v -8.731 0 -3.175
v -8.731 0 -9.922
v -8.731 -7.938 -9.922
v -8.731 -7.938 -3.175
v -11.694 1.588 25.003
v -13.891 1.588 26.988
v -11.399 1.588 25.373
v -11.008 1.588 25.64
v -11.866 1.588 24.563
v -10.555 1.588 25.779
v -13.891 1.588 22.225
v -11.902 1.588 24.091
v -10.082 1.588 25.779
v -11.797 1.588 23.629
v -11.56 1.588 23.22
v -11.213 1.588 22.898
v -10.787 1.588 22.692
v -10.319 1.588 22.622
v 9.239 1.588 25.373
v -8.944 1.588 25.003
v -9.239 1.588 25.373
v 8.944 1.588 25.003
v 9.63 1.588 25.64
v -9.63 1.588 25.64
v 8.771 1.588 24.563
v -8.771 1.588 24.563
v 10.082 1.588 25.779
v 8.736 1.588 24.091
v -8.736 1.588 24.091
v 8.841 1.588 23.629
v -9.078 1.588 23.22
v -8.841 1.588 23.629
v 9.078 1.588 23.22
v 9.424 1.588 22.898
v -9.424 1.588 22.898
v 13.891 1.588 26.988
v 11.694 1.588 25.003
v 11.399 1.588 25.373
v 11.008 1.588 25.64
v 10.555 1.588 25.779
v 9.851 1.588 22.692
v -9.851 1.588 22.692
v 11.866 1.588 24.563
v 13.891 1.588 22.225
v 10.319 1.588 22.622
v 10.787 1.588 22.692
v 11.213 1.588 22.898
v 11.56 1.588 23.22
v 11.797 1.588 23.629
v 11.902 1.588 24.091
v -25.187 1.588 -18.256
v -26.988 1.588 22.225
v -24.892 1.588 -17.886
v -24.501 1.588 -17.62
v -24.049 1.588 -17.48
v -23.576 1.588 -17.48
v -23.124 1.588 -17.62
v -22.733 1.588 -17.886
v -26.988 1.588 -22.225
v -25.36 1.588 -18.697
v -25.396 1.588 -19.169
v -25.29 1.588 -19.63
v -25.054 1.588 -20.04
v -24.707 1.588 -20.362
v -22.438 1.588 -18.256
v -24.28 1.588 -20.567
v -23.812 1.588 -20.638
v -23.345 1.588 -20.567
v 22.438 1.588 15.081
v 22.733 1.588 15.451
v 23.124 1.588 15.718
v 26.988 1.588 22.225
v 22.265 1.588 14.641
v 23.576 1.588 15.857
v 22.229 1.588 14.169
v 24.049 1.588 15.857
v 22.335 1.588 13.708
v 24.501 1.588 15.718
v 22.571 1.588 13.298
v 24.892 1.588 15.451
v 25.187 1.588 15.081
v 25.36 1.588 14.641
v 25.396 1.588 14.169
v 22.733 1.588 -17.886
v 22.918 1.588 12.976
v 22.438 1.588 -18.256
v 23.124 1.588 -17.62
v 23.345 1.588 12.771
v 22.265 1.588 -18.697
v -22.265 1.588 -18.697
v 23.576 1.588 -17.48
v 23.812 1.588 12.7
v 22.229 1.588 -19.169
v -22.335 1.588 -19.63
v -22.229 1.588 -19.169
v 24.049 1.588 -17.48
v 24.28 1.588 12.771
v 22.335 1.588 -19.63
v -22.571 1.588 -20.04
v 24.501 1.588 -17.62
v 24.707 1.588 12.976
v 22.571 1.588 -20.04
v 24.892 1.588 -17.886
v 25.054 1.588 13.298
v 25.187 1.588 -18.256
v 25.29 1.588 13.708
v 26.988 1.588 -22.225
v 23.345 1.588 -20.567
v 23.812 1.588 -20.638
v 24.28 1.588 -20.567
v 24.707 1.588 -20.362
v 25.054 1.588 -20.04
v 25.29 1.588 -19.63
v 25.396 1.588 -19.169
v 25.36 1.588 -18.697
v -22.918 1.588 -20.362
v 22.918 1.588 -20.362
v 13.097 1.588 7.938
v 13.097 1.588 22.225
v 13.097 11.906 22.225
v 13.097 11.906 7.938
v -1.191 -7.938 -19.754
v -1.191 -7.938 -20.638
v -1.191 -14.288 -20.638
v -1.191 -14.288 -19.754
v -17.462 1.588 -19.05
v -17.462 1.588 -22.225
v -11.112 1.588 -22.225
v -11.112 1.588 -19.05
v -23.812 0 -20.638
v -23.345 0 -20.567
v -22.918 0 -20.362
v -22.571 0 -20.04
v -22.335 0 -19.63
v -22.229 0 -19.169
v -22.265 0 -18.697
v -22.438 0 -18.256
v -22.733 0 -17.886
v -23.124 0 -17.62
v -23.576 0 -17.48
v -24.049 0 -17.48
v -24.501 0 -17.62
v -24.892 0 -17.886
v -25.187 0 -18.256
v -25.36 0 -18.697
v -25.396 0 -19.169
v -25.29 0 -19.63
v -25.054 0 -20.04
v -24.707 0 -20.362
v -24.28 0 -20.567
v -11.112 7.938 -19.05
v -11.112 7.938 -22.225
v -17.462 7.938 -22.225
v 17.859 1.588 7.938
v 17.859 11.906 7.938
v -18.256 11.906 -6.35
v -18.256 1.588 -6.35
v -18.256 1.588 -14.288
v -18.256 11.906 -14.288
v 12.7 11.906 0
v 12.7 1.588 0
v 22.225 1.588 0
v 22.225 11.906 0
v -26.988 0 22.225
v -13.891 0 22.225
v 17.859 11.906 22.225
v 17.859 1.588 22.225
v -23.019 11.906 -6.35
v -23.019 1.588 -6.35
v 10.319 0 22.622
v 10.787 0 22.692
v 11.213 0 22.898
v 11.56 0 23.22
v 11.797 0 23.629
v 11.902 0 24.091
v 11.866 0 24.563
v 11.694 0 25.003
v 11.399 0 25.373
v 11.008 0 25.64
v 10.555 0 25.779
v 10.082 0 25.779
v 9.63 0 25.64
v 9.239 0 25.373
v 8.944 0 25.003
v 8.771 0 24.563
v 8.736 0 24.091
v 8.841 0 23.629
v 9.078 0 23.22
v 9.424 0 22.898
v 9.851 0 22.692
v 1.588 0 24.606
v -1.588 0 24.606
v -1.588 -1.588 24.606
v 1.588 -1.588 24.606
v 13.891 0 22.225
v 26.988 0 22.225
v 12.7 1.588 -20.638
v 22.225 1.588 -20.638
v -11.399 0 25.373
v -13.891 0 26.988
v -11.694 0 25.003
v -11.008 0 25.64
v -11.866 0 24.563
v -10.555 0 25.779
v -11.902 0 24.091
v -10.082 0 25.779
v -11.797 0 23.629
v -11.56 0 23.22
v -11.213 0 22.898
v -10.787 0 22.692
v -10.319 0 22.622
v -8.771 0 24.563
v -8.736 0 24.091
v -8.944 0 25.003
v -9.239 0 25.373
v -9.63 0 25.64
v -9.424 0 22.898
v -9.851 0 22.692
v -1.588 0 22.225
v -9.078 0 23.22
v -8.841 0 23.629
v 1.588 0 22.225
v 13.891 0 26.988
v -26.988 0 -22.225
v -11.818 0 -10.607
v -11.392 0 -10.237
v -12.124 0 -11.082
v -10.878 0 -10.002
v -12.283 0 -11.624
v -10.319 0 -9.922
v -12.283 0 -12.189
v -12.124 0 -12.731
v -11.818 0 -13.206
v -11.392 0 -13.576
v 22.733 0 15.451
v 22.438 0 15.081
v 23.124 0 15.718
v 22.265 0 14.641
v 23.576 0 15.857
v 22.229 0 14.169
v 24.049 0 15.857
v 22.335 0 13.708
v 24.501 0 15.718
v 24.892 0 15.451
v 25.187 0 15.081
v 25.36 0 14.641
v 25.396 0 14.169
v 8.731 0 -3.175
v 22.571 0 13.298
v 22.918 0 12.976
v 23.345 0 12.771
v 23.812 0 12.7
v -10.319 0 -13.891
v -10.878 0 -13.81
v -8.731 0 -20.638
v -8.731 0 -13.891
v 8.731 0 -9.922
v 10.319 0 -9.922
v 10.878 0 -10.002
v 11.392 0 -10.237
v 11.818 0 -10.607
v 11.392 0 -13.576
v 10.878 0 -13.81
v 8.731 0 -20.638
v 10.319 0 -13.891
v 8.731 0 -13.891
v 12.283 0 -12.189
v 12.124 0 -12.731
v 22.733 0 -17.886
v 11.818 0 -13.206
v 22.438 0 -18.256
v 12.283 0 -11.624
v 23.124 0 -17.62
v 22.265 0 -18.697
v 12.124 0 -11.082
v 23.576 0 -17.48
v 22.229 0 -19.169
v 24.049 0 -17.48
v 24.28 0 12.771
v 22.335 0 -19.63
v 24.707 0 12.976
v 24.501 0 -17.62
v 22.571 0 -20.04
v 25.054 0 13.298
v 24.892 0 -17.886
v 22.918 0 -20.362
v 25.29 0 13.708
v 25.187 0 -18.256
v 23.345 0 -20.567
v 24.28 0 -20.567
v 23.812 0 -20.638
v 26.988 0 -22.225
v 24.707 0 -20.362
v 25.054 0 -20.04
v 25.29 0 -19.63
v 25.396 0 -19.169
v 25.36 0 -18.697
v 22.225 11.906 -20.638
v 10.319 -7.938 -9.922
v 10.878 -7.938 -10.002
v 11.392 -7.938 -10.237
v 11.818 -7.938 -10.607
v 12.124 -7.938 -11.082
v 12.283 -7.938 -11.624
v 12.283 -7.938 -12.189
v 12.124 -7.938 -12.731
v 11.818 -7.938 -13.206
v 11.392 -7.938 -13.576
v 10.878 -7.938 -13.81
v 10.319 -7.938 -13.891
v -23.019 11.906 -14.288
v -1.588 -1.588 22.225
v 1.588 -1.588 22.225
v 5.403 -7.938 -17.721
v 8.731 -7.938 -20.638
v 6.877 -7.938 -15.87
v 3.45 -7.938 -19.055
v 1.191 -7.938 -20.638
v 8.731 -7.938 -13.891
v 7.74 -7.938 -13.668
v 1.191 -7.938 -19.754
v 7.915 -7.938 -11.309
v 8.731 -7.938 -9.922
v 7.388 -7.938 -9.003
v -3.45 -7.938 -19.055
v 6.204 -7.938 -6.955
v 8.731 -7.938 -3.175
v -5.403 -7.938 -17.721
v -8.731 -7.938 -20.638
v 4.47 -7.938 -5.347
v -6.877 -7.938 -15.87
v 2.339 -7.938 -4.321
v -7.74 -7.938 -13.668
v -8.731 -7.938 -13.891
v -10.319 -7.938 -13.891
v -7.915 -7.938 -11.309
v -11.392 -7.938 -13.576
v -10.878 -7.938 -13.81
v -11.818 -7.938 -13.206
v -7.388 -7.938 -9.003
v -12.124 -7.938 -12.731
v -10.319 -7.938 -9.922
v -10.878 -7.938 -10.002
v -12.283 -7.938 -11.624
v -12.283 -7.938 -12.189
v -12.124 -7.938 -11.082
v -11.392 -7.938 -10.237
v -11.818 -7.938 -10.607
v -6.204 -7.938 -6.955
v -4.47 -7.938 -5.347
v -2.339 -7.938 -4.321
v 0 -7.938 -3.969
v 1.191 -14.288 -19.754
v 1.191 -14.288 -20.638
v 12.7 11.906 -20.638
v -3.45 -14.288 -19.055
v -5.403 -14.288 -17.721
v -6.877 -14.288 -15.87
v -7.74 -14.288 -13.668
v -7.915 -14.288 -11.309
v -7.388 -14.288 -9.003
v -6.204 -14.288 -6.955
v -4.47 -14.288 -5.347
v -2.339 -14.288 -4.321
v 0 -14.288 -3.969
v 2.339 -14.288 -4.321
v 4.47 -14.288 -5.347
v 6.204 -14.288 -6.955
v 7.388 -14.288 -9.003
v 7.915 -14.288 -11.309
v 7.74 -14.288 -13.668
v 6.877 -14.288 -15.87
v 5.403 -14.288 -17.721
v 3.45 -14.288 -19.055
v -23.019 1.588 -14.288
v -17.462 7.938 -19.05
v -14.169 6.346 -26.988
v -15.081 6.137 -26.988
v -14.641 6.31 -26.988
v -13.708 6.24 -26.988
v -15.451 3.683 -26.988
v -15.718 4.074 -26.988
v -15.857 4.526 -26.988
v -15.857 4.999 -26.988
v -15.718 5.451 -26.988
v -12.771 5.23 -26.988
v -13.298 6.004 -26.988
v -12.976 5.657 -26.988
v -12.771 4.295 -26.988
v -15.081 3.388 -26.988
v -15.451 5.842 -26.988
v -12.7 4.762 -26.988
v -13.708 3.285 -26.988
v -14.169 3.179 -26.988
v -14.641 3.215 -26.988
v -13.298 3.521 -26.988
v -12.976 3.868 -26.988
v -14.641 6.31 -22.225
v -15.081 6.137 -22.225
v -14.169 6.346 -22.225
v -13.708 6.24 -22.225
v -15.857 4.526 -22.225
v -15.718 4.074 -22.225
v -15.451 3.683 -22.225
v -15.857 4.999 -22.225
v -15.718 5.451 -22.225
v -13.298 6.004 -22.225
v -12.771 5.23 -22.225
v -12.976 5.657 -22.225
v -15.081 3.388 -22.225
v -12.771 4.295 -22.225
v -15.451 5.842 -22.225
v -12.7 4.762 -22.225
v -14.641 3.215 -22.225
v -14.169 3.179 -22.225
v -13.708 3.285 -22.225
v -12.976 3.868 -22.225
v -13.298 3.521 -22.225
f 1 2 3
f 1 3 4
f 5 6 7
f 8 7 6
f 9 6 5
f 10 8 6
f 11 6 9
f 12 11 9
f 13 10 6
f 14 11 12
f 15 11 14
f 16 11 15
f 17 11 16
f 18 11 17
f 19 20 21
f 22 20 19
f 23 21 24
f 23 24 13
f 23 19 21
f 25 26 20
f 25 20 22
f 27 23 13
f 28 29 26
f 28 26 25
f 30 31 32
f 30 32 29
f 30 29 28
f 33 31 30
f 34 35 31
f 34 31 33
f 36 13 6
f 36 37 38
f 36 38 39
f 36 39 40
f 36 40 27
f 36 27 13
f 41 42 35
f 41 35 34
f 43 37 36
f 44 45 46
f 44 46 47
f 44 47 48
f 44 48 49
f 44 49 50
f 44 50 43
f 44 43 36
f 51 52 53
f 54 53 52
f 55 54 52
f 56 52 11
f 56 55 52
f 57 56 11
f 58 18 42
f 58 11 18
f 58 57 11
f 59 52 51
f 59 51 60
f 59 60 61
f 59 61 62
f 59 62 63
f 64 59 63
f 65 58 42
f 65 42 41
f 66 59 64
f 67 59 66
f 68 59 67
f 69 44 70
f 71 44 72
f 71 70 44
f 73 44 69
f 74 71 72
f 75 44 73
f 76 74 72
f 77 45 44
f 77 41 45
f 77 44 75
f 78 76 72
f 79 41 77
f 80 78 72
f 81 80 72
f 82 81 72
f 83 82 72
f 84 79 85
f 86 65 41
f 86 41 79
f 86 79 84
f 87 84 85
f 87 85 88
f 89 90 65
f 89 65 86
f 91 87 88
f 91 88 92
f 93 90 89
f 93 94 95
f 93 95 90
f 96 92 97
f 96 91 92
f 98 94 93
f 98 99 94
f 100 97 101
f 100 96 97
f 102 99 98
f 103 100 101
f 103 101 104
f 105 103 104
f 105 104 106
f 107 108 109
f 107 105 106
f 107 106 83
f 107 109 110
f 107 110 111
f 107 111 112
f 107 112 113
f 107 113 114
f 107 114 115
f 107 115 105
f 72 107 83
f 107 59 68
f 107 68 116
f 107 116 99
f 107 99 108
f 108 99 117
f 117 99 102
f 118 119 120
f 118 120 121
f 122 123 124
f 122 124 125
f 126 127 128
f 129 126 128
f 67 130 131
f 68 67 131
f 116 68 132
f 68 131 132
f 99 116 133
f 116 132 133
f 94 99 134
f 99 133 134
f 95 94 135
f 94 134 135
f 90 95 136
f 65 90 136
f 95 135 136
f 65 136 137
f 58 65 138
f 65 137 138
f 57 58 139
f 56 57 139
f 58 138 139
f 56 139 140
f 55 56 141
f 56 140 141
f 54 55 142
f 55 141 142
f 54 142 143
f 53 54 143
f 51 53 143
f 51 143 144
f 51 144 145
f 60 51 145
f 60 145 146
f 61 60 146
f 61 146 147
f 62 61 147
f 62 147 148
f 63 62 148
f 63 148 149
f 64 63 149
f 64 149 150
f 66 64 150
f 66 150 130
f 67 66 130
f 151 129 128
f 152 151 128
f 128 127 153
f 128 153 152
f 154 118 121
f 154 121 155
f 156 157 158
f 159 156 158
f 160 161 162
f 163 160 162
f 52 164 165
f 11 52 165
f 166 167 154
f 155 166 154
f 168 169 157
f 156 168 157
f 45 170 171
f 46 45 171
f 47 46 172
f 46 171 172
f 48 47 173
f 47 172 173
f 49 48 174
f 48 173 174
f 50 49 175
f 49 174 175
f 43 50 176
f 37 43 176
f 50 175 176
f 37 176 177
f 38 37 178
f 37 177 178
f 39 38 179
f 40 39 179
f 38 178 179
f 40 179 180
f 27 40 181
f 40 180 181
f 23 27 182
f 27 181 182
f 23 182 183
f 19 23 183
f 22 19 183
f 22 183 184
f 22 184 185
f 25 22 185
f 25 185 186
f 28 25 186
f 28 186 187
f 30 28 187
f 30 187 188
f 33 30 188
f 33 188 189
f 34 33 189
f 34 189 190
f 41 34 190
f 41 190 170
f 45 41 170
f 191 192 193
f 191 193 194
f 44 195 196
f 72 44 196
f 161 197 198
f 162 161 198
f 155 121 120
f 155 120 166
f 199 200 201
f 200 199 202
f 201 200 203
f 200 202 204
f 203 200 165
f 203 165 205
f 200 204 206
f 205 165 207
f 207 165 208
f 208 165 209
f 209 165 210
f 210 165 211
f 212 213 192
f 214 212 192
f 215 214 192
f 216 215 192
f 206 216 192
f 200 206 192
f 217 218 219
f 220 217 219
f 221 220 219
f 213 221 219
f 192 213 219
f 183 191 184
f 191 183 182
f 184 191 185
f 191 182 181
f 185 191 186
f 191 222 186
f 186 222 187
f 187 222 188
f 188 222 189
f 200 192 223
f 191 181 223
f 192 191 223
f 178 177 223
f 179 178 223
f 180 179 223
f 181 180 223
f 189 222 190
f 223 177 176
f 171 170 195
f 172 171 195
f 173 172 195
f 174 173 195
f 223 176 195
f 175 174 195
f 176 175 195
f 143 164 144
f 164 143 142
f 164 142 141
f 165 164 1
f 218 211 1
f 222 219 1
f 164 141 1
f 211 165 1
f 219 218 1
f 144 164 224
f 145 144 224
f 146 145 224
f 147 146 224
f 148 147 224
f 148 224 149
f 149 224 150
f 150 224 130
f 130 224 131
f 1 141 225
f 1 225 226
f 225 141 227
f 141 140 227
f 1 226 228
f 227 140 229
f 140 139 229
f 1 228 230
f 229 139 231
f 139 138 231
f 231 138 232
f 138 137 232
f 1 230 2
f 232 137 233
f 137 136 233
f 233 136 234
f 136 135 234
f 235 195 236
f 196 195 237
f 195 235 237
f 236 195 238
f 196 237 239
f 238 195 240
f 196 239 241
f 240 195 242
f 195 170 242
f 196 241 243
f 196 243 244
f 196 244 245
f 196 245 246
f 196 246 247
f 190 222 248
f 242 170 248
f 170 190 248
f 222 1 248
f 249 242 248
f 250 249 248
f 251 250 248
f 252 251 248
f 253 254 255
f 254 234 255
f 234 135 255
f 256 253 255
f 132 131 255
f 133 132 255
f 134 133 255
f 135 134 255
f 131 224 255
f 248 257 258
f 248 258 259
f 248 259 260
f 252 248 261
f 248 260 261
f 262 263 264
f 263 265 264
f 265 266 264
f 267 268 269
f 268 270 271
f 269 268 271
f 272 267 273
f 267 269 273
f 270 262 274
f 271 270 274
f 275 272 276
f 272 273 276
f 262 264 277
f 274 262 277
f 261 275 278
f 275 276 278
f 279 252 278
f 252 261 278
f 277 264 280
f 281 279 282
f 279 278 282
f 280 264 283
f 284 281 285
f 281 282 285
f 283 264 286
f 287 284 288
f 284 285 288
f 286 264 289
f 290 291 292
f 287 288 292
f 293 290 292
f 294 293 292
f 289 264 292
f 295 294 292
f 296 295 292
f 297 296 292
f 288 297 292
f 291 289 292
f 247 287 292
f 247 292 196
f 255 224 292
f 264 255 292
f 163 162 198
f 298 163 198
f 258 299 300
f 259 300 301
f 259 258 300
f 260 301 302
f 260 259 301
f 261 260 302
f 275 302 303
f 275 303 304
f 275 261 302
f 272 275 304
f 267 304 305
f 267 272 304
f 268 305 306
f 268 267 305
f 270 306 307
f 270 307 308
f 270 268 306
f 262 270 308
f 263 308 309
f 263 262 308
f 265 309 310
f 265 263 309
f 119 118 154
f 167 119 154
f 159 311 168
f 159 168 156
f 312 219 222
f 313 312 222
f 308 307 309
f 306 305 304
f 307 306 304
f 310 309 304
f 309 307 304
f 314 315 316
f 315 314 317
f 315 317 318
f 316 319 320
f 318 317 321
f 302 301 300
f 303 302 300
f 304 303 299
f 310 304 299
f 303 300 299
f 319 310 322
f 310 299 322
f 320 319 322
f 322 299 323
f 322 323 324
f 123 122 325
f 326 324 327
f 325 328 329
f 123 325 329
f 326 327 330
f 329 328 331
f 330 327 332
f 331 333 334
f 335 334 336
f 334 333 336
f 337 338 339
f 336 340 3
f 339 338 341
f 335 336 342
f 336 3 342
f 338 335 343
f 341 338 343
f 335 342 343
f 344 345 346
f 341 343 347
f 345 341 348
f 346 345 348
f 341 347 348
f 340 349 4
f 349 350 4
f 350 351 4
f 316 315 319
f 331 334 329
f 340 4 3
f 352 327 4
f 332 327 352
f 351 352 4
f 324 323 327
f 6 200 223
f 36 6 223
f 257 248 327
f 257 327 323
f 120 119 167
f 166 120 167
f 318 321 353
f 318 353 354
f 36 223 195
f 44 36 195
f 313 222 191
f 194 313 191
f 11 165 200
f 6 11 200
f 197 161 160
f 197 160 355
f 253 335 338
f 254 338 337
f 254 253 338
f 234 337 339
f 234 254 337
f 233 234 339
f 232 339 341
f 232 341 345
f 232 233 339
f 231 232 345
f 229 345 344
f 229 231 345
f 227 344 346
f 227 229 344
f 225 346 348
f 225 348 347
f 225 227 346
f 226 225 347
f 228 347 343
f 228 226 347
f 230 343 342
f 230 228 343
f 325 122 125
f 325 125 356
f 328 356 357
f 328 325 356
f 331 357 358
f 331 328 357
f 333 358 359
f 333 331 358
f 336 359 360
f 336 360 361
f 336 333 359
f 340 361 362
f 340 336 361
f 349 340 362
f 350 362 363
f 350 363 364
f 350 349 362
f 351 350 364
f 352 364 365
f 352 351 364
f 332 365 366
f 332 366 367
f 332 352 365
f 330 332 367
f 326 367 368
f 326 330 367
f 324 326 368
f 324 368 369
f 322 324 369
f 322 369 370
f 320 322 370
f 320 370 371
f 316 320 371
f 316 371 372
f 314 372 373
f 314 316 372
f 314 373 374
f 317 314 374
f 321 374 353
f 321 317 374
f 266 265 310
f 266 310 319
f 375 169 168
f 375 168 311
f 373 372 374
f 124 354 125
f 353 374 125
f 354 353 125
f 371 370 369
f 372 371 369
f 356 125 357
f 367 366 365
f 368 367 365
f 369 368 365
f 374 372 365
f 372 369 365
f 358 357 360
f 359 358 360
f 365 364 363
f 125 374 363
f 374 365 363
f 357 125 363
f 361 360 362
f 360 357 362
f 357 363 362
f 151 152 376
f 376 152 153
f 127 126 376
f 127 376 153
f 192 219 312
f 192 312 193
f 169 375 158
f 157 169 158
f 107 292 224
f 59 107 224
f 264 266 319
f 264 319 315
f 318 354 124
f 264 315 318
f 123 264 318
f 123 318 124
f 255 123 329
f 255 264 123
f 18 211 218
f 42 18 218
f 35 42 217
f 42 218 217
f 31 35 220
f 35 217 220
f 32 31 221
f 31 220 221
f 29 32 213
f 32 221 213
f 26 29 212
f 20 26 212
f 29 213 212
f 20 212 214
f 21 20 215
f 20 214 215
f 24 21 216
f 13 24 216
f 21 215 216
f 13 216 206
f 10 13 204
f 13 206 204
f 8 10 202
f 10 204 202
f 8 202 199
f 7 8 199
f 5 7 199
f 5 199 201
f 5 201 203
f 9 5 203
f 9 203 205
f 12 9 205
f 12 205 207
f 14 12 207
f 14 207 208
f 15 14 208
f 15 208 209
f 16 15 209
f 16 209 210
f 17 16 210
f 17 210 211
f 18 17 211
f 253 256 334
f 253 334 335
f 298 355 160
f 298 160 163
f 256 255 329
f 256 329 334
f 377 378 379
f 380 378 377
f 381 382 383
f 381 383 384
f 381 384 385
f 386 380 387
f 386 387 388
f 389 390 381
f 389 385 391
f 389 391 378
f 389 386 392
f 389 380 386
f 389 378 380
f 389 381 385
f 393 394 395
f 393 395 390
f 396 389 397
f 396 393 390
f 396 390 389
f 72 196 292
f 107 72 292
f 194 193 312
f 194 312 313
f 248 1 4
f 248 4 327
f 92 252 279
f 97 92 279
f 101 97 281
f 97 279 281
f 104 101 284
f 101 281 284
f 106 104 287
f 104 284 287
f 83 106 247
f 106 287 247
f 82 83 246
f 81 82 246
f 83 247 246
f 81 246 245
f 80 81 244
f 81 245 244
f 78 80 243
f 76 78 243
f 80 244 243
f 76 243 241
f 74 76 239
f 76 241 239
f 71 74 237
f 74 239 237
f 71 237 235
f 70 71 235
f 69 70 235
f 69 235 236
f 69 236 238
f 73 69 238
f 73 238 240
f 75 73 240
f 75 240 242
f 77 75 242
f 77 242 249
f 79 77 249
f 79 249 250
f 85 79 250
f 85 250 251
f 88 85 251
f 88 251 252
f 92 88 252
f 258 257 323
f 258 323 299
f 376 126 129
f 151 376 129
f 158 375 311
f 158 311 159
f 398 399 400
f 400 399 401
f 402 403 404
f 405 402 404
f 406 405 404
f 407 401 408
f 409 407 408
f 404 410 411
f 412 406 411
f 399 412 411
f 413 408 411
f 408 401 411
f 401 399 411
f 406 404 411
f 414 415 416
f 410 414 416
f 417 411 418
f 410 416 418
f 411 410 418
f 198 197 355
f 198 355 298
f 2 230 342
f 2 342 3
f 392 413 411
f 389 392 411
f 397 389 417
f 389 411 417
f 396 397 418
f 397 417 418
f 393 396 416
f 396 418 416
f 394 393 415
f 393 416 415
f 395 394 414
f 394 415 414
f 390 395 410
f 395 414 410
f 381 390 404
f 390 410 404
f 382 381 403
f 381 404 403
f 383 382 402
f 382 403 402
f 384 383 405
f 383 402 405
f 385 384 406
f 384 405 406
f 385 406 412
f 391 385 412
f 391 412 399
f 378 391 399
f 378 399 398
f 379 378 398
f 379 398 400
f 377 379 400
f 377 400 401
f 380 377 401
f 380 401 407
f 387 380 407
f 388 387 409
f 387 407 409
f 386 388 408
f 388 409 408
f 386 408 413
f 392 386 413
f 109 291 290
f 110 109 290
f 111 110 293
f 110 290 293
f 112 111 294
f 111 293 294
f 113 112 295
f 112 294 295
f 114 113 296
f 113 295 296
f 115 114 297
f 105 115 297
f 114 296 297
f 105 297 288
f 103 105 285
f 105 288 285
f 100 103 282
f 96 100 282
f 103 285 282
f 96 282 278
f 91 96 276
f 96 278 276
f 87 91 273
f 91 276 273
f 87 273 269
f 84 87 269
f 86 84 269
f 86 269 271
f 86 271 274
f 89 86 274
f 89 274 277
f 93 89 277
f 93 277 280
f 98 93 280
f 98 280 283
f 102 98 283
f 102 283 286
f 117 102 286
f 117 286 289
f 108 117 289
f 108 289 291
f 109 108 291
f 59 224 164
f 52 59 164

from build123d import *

# Parameters (mm, degrees)
BOSS_EXTRUDE1_DEPTH   = 1.5875
SKETCH2_W             = 4.7625
SKETCH2_H             = 14.2875
BOSS_EXTRUDE2_DEPTH   = 10.31875
SKETCH2_H_2           = 7.9375
BOSS_EXTRUDE2_2_DEPTH = 10.31875
SKETCH2_W_2           = 6.35
SKETCH2_H_3           = 3.175
BOSS_EXTRUDE2_3_DEPTH = 10.31875
SKETCH2_W_3           = 9.525
SKETCH2_H_4           = 20.6375
BOSS_EXTRUDE2_4_DEPTH = 10.31875
SKETCH3_R             = 1.5875
BOSS_EXTRUDE3_DEPTH   = 4.7625
SKETCH4_W             = 6.35
SKETCH4_H             = 3.96875
CUT_EXTRUDE1_DEPTH    = 58.37555317
BOSS_EXTRUDE4_DEPTH   = 7.9375
BOSS_EXTRUDE5_DEPTH   = 6.35
SKETCH7_R             = 1.5875
CUT_EXTRUDE2_DEPTH    = 41.752705048
SKETCH9_W             = 3.175
SKETCH9_H             = 2.38125
BOSS_EXTRUDE6_DEPTH   = 1.5875


with BuildPart() as part:
    # Sketch1 → Boss-Extrude1 (new body)
    with BuildSketch(Plane(origin=(0, 0, 0), x_dir=(1, 0, 0), z_dir=(0, 1, 0))):
        Polygon((13.890625, -22.225), (26.9875, -22.225), (26.9875, 22.225), (-26.9875, 22.225), (-26.9875, -22.225), (-13.890625, -22.225), (-13.890625, -26.9875), (13.890625, -26.9875), align=None)
    extrude(amount=BOSS_EXTRUDE1_DEPTH)

    # Sketch5 → Boss-Extrude4 (add)
    with BuildSketch(Plane.XZ):
        with BuildLine():
            Line((8.73125, -20.6375), (-8.73125, -20.6375))
            Line((-8.73125, -20.6375), (-8.73125, -13.890625))
            Line((-8.73125, -13.890625), (-10.31875, -13.890625))
            ThreePointArc((-10.31875, -13.890625), (-12.303125, -11.90625), (-10.31875, -9.921875))
            Line((-10.31875, -9.921875), (-8.73125, -9.921875))
            Line((-8.73125, -9.921875), (-8.73125, -3.175))
            Line((-8.73125, -3.175), (8.73125, -3.175))
            Line((8.73125, -3.175), (8.73125, -9.921875))
            Line((8.73125, -9.921875), (10.31875, -9.921875))
            ThreePointArc((10.31875, -9.921875), (12.303125, -11.90625), (10.31875, -13.890625))
            Line((10.31875, -13.890625), (8.73125, -13.890625))
            Line((8.73125, -13.890625), (8.73125, -20.6375))
        make_face()
    extrude(amount=BOSS_EXTRUDE4_DEPTH)

    # Sketch6 → Boss-Extrude5 (add)
    with BuildSketch(Plane.XZ.offset(7.9375)):
        with BuildLine():
            Line((1.190625, -20.6375), (-1.190625, -20.6375))
            Line((-1.190625, -20.6375), (-1.190625, -19.753945099))
            ThreePointArc((-1.190625, -19.753945099), (0, -3.96875), (1.190625, -19.753945099))
            Line((1.190625, -19.753945099), (1.190625, -20.6375))
        make_face()
    extrude(amount=BOSS_EXTRUDE5_DEPTH)

    # Sketch7 → Cut-Extrude2 (cut, through all)
    with BuildSketch(Plane.XZ):
        with Locations(Location((23.8125, -19.05, 0), (0, 0, 270))):
            Circle(SKETCH7_R)
        with Locations(Location((-23.8125, -19.05, 0), (0, 0, 270))):
            Circle(SKETCH7_R)
        with Locations(Location((-10.31875, 24.209375, 0), (0, 0, 270))):
            Circle(SKETCH7_R)
        with Locations(Location((10.31875, 24.209375, 0), (0, 0, 270))):
            Circle(SKETCH7_R)
        with Locations(Location((23.8125, 14.2875, 0), (0, 0, 270))):
            Circle(SKETCH7_R)
    extrude(amount=-CUT_EXTRUDE2_DEPTH, mode=Mode.SUBTRACT)

    # Sketch9 → Boss-Extrude6 (add)
    with BuildSketch(Plane.XZ):
        with Locations((0, 23.415625)):
            Rectangle(SKETCH9_W, SKETCH9_H)
    extrude(amount=BOSS_EXTRUDE6_DEPTH)


with BuildPart() as body_2:
    # Sketch2 → Boss-Extrude2 (new body)
    with BuildSketch(Plane(origin=(0, 1.5875, 0), x_dir=(1, 0, 0), z_dir=(0, 1, 0))):
        with Locations((15.478125, -15.08125)):
            Rectangle(SKETCH2_W, SKETCH2_H)
    extrude(amount=BOSS_EXTRUDE2_DEPTH)


with BuildPart() as body_3:
    # Sketch2 → Boss-Extrude2 2 (new body)
    with BuildSketch(Plane(origin=(0, 1.5875, 0), x_dir=(1, 0, 0), z_dir=(0, 1, 0))):
        with Locations((-20.6375, 10.31875)):
            Rectangle(SKETCH2_W, SKETCH2_H_2)
    extrude(amount=BOSS_EXTRUDE2_2_DEPTH)


with BuildPart() as body_4:
    # Sketch2 → Boss-Extrude2 3 (new body)
    with BuildSketch(Plane(origin=(0, 1.5875, 0), x_dir=(1, 0, 0), z_dir=(0, 1, 0))):
        with Locations((-14.2875, 20.6375)):
            Rectangle(SKETCH2_W_2, SKETCH2_H_3)
    extrude(amount=BOSS_EXTRUDE2_3_DEPTH)

    # Sketch4 → Cut-Extrude1 (cut, through all)
    with BuildSketch(Plane(origin=(0, 0, -22.225), x_dir=(-1, 0, 0), z_dir=(0, 0, -1))):
        with Locations((14.2875, 9.921875)):
            Rectangle(SKETCH4_W, SKETCH4_H)
    extrude(amount=-CUT_EXTRUDE1_DEPTH, mode=Mode.SUBTRACT)


with BuildPart() as body_5:
    # Sketch2 → Boss-Extrude2 4 (new body)
    with BuildSketch(Plane(origin=(0, 1.5875, 0), x_dir=(1, 0, 0), z_dir=(0, 1, 0))):
        with Locations((17.4625, 10.31875)):
            Rectangle(SKETCH2_W_3, SKETCH2_H_4)
    extrude(amount=BOSS_EXTRUDE2_4_DEPTH)


with BuildPart() as body_6:
    # Sketch3 → Boss-Extrude3 (new body)
    with BuildSketch(Plane(origin=(0, 0, -22.225), x_dir=(-1, 0, 0), z_dir=(0, 0, -1))):
        with Locations(Location((14.2875, 4.7625, 0), (0, 0, 180))):
            Circle(SKETCH3_R)
    extrude(amount=BOSS_EXTRUDE3_DEPTH)


solid = Compound([part.part, body_2.part, body_3.part, body_4.part, body_5.part, body_6.part])
